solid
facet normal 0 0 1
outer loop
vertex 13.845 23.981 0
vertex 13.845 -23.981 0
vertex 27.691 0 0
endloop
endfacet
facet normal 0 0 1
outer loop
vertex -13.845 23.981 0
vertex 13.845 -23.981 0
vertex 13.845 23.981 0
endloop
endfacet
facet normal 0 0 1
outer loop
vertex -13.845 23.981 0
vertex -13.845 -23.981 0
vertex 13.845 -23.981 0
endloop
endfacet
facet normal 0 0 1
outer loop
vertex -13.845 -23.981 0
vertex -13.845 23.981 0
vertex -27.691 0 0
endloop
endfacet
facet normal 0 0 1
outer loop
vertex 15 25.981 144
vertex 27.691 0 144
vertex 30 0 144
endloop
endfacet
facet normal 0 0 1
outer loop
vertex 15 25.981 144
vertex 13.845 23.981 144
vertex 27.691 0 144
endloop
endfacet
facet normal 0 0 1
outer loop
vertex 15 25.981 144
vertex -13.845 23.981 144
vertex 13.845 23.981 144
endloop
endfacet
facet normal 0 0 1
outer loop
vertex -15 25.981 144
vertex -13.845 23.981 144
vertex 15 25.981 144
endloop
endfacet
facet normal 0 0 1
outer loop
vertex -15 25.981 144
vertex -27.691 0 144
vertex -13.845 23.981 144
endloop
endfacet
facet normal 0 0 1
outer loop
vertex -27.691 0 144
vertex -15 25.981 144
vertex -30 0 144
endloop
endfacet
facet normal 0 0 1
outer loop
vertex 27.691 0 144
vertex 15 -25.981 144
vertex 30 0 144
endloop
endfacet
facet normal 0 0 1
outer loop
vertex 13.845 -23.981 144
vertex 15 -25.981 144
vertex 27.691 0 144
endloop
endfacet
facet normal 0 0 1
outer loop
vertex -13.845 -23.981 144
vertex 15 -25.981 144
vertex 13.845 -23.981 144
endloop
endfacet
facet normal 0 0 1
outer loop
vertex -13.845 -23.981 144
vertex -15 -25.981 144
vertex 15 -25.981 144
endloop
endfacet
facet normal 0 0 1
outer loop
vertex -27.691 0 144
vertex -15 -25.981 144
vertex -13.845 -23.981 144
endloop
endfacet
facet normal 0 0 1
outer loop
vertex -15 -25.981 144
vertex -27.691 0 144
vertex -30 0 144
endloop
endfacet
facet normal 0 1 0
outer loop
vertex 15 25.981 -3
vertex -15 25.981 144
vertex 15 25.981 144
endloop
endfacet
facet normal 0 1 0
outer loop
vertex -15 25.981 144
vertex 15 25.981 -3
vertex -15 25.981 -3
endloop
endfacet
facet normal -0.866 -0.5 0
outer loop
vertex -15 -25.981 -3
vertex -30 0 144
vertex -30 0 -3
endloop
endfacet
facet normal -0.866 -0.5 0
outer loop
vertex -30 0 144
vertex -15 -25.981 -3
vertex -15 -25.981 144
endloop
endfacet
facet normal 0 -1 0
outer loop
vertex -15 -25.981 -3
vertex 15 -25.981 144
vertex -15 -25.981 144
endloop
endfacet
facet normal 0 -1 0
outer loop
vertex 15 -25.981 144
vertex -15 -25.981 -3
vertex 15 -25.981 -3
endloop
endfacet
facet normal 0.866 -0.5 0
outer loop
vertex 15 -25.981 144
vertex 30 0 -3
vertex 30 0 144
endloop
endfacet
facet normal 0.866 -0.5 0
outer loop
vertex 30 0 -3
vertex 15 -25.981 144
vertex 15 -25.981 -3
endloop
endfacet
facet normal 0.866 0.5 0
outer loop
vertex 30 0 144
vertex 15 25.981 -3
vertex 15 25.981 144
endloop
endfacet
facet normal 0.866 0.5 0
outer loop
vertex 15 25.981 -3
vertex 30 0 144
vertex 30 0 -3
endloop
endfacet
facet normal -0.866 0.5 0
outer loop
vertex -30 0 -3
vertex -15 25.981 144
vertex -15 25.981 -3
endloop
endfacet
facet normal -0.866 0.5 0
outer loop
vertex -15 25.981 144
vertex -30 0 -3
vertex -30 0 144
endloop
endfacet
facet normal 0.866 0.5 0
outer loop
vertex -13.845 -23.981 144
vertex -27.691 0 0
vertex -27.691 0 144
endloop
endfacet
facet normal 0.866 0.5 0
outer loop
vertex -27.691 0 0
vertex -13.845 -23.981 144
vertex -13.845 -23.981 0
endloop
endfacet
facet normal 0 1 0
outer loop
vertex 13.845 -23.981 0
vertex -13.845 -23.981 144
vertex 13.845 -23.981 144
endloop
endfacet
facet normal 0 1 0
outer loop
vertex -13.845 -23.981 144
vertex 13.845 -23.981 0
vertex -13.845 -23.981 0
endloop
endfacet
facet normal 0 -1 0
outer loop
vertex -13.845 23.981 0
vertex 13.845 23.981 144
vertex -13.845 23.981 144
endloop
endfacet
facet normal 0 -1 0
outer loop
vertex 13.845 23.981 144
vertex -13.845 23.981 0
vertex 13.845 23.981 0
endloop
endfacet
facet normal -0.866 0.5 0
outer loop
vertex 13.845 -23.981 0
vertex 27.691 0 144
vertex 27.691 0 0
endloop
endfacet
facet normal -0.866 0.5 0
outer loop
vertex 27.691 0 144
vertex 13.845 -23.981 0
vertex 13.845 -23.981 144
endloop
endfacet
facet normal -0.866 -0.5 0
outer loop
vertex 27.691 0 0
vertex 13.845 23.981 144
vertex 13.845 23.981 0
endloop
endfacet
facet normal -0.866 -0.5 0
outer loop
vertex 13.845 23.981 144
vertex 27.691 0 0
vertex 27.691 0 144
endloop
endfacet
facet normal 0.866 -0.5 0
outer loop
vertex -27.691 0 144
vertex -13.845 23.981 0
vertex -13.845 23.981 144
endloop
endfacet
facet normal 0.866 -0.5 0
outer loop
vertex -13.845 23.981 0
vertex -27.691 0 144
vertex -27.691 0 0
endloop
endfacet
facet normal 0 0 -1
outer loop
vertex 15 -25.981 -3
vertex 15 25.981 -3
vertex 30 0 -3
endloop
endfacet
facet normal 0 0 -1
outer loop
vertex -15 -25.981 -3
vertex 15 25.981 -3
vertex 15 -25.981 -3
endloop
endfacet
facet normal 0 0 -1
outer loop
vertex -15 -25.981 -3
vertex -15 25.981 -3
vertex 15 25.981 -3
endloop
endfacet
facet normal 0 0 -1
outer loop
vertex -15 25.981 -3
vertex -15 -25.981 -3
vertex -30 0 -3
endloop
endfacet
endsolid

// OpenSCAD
//number of sides
sides = 6;
//spacing of Z levels
z_spacing = 12;
//maximum radius, center to outer vertex
m_radius = 30;
//thickness (at thickest part)
thickness = 2;
// number of levels 
nlevel = 12;
//linear phase angle change, determinesm linear twistiness (degrees/unitlength)
phasediff = sin(360*$t);
//base thickness, if 0 there is no base.
bthick = 3;
//period of wavyness alongz (unitlength), do not make 0
period = 144;
//amplitude of wavyness (degrees), make 0 if you dont want sine component
amplitude = 0;

module makepolyhelix(level,side,spacing,radius,phase,amp,per){// level = # of levels, side = number of sides of polygon, spacing = length between levels, radius = distance from center to vertex of polygon, phase = number of degrees the polygon is rotated on every level, amp is the amplitude of a sin() component, per is the period of that sin component
    points = [for (i = [0:level]) for (j = [0:(side -1)]) [radius*cos(amp*sin(i*spacing*(360/per)) +i*spacing*phase + j*(360/side)),radius*sin(amp*sin(i*spacing*(360/per)) + i*spacing*phase + j*(360/side)),i*spacing] ];
    //generate two triangular faces for each generation of nested for loop, not sure how to make this more readable
    faces = [for (i = [0:(level-1)]) for (j = [0:(side -1)]) each 
        [ [j+(i*side), j+side*(i+1), (j+1)%side+i*side],
        [(j+1)%side+(i*side), j+side*(i+1), ((j+1)%side)+(i+1)*side]]];
    
    bottomface = [for (i = [0:side-1]) i];
    topface = [for (i = [1:side]) side*(level+1)-i];
    
    faces2 = concat(faces,[bottomface],[topface]);
    
    polyhedron(points,faces2);
}

i_radius = m_radius - thickness/cos((360/sides)/2);// calculates inner radius from thickness and outer radius.
            
difference(){
    makepolyhelix(nlevel,sides,z_spacing,m_radius,phasediff,amplitude,period);
    makepolyhelix(nlevel+1,sides,z_spacing,i_radius,phasediff,amplitude,period);
}
if (bthick > 0){
mirror([0,0,1]){makepolyhelix(1,sides,bthick,m_radius,-phasediff,-amplitude,period);}
}
